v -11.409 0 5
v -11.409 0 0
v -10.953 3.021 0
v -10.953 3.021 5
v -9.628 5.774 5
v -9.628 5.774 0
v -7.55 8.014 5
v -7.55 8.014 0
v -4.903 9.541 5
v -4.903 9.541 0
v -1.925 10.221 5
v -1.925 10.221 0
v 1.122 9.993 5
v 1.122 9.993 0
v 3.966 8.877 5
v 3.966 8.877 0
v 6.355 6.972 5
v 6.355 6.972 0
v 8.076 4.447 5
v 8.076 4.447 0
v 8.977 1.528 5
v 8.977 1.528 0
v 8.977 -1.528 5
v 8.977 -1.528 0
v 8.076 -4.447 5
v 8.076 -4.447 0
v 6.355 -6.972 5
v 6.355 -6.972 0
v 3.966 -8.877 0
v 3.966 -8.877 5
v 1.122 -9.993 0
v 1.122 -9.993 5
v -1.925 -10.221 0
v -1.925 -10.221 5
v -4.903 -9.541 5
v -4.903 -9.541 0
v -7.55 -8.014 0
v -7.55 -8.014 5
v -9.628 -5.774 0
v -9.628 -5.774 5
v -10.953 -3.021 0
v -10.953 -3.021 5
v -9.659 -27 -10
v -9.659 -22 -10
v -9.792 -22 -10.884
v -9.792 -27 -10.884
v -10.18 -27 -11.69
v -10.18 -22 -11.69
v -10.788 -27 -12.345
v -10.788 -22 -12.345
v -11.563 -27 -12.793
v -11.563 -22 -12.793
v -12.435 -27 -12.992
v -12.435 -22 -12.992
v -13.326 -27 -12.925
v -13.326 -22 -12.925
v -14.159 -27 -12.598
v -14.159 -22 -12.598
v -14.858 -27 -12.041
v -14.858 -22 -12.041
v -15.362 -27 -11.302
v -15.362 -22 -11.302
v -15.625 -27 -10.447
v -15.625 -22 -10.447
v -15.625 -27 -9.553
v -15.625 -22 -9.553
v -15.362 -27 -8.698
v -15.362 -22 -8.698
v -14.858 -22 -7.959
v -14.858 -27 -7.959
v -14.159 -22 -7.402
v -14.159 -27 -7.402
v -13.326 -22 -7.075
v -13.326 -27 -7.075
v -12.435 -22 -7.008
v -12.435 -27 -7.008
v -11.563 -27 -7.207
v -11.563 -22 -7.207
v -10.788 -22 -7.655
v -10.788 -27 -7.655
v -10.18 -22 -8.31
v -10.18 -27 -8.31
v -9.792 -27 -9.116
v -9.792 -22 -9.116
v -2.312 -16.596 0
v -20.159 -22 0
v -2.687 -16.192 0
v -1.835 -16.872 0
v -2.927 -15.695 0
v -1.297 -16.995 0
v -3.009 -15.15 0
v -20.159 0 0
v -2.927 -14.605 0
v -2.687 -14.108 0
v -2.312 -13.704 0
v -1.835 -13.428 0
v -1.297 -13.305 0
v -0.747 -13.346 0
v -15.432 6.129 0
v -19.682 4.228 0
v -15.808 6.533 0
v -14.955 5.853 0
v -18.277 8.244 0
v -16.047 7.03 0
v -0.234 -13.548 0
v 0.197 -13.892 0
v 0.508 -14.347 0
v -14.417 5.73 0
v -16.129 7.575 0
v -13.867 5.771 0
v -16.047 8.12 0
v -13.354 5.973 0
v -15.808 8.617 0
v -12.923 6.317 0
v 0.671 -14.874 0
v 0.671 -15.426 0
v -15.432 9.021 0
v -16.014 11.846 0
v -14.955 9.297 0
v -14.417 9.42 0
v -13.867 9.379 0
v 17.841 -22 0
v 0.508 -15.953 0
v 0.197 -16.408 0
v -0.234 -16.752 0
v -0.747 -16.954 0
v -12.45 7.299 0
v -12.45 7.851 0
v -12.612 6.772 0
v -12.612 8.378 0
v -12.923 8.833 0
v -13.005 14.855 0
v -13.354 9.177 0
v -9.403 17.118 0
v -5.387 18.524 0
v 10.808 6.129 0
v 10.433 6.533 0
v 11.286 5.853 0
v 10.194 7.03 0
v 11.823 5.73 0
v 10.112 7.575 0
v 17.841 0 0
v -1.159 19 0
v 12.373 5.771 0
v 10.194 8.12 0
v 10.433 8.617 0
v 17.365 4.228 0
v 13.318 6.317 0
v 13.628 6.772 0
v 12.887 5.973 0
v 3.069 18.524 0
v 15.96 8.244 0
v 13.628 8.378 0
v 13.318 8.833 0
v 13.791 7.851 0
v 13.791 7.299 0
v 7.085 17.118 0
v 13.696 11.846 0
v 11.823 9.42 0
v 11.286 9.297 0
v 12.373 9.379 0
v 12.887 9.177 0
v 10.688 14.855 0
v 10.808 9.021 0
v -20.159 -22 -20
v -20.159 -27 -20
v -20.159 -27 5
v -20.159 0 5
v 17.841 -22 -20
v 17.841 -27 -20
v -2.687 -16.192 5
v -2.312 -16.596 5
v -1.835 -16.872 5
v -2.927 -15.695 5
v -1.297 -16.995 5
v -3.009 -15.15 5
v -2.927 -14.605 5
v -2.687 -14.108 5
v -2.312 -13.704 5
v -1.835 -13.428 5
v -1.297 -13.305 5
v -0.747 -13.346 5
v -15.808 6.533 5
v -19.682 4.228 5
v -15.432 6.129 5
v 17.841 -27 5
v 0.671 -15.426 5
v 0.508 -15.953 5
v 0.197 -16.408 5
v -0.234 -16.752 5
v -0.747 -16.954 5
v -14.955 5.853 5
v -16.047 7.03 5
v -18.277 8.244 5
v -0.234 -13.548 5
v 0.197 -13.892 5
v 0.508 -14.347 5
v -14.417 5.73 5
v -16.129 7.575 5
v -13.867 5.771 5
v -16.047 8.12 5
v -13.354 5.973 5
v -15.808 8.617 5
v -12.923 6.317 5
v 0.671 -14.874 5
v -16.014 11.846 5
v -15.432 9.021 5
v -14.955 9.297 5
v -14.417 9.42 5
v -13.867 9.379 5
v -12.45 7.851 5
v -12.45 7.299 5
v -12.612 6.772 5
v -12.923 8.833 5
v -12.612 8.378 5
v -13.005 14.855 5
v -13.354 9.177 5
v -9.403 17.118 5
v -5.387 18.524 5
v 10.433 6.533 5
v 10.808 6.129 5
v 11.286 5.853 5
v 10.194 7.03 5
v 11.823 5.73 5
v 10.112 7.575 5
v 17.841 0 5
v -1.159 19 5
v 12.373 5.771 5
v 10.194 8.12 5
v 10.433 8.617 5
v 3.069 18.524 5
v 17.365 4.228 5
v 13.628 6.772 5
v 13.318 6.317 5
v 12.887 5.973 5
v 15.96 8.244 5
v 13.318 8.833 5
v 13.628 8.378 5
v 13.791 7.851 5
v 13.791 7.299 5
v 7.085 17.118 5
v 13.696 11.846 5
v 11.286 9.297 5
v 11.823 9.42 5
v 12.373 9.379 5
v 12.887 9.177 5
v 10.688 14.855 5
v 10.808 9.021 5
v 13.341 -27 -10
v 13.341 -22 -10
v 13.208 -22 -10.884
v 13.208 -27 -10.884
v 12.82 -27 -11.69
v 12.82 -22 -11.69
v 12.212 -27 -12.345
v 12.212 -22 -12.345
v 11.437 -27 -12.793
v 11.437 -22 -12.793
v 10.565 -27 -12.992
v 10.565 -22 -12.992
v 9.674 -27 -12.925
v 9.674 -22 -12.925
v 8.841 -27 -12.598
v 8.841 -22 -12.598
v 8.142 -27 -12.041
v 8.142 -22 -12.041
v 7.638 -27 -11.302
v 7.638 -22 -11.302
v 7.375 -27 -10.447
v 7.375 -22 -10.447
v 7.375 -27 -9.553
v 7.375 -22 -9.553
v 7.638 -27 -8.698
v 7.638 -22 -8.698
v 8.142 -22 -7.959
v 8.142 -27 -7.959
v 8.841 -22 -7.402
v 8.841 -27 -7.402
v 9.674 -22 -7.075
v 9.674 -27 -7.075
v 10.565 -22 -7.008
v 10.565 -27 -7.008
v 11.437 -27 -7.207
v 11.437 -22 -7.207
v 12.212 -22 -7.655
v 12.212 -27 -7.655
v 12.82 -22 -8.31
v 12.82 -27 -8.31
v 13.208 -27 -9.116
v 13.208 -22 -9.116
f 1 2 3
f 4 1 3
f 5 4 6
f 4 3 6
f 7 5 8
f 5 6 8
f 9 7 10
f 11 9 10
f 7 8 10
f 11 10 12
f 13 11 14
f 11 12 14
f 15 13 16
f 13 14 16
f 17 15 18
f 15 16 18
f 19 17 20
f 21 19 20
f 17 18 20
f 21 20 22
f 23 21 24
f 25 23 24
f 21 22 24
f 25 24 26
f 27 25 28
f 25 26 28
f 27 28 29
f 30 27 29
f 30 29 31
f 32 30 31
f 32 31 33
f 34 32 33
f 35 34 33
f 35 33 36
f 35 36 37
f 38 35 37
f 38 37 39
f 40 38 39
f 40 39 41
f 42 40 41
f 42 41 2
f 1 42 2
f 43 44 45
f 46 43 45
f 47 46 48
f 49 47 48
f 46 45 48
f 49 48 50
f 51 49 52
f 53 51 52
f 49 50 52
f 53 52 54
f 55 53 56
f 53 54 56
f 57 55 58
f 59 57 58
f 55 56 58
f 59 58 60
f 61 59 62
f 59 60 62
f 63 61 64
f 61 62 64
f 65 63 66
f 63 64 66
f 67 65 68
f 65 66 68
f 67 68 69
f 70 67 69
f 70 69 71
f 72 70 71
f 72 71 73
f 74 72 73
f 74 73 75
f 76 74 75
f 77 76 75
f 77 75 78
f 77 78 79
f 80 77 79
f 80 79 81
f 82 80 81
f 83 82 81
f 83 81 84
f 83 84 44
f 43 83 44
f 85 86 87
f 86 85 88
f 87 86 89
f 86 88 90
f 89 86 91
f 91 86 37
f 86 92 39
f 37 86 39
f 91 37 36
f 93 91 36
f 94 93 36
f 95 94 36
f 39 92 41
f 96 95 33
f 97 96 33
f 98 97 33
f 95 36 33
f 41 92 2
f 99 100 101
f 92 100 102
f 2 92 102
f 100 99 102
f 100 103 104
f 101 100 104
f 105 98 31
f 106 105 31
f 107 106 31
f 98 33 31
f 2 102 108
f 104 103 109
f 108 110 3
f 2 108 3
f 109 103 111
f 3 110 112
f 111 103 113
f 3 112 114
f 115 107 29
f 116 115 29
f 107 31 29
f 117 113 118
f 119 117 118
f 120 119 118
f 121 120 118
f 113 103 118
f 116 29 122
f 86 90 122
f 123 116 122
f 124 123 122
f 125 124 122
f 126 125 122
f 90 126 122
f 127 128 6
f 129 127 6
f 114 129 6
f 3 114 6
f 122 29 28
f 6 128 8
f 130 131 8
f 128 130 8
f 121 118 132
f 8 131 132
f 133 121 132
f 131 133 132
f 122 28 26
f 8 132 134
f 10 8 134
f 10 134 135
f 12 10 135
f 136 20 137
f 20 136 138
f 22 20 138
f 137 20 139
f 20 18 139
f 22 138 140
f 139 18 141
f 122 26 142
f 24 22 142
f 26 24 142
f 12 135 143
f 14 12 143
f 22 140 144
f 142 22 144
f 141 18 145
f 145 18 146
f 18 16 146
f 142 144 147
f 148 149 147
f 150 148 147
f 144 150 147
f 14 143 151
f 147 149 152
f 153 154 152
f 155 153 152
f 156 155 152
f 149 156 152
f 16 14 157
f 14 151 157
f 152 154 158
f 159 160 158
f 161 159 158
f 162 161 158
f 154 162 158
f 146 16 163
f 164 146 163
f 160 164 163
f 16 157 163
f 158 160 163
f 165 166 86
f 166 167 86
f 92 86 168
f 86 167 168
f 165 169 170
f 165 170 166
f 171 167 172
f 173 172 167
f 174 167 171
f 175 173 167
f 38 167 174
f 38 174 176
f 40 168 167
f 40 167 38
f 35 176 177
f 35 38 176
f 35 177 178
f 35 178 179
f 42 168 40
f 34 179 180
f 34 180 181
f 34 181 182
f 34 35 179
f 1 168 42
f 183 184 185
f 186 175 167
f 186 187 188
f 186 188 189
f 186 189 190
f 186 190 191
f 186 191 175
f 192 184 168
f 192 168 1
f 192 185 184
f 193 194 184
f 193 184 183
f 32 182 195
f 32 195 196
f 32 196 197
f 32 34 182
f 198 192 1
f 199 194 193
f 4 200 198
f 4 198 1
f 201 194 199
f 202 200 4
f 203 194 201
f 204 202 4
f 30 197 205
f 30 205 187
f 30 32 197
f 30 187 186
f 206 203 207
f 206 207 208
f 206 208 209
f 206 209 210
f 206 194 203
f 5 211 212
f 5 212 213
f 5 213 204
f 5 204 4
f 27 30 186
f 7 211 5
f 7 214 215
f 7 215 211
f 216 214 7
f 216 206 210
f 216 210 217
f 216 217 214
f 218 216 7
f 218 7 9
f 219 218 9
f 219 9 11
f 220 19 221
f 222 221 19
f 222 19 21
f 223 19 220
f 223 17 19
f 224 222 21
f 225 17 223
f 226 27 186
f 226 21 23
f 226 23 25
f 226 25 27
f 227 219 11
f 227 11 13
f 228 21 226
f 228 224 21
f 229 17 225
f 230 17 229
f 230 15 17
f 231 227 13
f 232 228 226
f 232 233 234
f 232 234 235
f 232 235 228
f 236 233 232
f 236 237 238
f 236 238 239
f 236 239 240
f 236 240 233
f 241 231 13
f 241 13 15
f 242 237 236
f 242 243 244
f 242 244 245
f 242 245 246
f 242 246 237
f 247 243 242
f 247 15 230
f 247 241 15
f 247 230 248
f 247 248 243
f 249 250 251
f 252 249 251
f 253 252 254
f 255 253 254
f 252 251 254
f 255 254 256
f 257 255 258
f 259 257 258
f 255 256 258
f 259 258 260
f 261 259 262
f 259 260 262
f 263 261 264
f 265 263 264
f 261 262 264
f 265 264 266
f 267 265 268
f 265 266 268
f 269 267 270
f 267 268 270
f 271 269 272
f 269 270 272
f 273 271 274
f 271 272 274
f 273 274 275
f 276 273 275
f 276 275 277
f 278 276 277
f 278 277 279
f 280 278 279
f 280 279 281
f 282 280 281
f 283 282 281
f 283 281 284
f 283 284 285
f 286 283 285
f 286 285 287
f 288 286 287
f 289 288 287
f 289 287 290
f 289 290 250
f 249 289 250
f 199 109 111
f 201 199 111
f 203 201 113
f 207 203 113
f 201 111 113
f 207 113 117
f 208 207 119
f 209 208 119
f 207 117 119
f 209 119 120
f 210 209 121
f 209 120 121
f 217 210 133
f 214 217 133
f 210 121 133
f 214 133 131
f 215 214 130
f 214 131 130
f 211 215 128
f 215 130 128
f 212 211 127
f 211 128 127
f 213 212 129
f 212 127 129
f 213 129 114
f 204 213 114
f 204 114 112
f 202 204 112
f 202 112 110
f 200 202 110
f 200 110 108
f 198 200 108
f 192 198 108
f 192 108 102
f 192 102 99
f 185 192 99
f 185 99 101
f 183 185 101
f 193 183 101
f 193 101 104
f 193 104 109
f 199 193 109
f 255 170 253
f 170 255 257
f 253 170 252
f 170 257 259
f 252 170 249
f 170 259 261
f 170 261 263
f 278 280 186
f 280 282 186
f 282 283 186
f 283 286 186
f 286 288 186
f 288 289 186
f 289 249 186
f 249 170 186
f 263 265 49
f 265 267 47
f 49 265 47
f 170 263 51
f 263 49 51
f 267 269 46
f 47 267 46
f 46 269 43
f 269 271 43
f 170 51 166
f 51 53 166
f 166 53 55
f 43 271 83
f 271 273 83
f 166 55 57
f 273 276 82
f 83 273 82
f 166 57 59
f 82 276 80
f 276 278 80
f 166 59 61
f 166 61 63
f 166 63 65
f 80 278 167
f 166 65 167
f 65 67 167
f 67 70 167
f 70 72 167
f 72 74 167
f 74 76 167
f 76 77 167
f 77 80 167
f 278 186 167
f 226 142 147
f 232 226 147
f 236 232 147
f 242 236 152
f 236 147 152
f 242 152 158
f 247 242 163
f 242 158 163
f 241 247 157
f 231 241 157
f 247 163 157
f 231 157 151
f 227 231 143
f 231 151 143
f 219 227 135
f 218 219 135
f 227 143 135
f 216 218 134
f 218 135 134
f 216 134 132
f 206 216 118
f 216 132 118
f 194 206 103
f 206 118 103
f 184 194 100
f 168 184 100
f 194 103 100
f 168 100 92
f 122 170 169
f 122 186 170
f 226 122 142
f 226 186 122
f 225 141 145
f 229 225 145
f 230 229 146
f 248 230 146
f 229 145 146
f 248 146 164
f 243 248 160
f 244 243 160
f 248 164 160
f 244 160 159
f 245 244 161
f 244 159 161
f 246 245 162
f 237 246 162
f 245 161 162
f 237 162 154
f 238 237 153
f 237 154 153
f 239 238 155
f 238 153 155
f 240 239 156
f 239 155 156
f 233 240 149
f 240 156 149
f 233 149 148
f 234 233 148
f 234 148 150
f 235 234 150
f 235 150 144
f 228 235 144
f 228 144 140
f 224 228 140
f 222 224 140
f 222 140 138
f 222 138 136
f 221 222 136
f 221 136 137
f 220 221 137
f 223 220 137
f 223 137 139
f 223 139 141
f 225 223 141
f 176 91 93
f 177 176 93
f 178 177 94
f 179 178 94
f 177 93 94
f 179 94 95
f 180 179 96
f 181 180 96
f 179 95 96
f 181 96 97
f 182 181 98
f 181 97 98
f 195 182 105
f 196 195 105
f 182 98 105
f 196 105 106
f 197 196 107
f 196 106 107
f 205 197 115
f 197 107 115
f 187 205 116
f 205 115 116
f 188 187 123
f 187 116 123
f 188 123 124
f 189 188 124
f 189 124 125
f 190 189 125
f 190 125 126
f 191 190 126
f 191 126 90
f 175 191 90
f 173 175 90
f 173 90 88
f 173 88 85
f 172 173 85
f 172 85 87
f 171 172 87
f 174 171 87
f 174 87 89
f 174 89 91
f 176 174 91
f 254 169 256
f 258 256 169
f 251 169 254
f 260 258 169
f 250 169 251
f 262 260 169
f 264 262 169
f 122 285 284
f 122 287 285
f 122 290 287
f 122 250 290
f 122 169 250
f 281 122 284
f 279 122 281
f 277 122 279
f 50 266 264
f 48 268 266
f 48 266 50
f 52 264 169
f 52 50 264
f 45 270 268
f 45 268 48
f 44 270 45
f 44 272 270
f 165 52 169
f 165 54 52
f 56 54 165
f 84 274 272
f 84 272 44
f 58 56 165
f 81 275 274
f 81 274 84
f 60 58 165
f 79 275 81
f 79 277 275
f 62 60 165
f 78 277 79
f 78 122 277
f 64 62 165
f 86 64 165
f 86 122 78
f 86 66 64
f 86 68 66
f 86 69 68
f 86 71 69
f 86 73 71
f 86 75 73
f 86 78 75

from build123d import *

# Parameters (mm, degrees)
BOSS_EXTRUDE1_DEPTH = 5
SKETCH2_R           = 10.25
SKETCH2_R_2         = 1.85
CUT_EXTRUDE1_DEPTH  = 6
SKETCH3_W           = 38
SKETCH3_H           = 5
BOSS_EXTRUDE2_DEPTH = 20
SKETCH4_R           = 3
CUT_EXTRUDE2_DEPTH  = 6


with BuildPart() as part:
    # Sketch1 → Boss-Extrude1 (new body)
    with BuildSketch(Plane.XY):
        with BuildLine():
            Line((-20.15873891, 0), (-20.15873891, -27))
            Line((-20.15873891, -27), (17.84126109, -27))
            Line((17.84126109, -27), (17.84126109, 0))
            ThreePointArc((17.84126109, 0), (-1.15873891, 19), (-20.15873891, 0))
        make_face()
    extrude(amount=BOSS_EXTRUDE1_DEPTH)

    # Sketch2 → Cut-Extrude1 (cut, through all)
    with BuildSketch(Plane(origin=(0, 0, 0), x_dir=(-1, 0, 0), z_dir=(0, 0, -1))):
        with Locations((1.15873891, 0)):
            Circle(SKETCH2_R)
        with Locations((1.15873891, -15.15)):
            Circle(SKETCH2_R_2)
        with Locations((-11.961545957, 7.575)):
            Circle(SKETCH2_R_2)
        with Locations((14.279023778, 7.575)):
            Circle(SKETCH2_R_2)
    extrude(amount=-CUT_EXTRUDE1_DEPTH, mode=Mode.SUBTRACT)

    # Sketch3 → Boss-Extrude2 (add)
    with BuildSketch(Plane(origin=(0, 0, 0), x_dir=(-1, 0, 0), z_dir=(0, 0, -1))):
        with Locations((1.15873891, -24.5)):
            Rectangle(SKETCH3_W, SKETCH3_H)
    extrude(amount=BOSS_EXTRUDE2_DEPTH)

    # Sketch4 → Cut-Extrude2 (cut, through all)
    with BuildSketch(Plane(origin=(0, -22, 0), x_dir=(1, 0, 0), z_dir=(0, 1, 0))):
        with Locations((10.34126109, 10)):
            Circle(SKETCH4_R)
        with Locations((-12.65873891, 10)):
            Circle(SKETCH4_R)
    extrude(amount=-CUT_EXTRUDE2_DEPTH, mode=Mode.SUBTRACT)


solid = part.part
